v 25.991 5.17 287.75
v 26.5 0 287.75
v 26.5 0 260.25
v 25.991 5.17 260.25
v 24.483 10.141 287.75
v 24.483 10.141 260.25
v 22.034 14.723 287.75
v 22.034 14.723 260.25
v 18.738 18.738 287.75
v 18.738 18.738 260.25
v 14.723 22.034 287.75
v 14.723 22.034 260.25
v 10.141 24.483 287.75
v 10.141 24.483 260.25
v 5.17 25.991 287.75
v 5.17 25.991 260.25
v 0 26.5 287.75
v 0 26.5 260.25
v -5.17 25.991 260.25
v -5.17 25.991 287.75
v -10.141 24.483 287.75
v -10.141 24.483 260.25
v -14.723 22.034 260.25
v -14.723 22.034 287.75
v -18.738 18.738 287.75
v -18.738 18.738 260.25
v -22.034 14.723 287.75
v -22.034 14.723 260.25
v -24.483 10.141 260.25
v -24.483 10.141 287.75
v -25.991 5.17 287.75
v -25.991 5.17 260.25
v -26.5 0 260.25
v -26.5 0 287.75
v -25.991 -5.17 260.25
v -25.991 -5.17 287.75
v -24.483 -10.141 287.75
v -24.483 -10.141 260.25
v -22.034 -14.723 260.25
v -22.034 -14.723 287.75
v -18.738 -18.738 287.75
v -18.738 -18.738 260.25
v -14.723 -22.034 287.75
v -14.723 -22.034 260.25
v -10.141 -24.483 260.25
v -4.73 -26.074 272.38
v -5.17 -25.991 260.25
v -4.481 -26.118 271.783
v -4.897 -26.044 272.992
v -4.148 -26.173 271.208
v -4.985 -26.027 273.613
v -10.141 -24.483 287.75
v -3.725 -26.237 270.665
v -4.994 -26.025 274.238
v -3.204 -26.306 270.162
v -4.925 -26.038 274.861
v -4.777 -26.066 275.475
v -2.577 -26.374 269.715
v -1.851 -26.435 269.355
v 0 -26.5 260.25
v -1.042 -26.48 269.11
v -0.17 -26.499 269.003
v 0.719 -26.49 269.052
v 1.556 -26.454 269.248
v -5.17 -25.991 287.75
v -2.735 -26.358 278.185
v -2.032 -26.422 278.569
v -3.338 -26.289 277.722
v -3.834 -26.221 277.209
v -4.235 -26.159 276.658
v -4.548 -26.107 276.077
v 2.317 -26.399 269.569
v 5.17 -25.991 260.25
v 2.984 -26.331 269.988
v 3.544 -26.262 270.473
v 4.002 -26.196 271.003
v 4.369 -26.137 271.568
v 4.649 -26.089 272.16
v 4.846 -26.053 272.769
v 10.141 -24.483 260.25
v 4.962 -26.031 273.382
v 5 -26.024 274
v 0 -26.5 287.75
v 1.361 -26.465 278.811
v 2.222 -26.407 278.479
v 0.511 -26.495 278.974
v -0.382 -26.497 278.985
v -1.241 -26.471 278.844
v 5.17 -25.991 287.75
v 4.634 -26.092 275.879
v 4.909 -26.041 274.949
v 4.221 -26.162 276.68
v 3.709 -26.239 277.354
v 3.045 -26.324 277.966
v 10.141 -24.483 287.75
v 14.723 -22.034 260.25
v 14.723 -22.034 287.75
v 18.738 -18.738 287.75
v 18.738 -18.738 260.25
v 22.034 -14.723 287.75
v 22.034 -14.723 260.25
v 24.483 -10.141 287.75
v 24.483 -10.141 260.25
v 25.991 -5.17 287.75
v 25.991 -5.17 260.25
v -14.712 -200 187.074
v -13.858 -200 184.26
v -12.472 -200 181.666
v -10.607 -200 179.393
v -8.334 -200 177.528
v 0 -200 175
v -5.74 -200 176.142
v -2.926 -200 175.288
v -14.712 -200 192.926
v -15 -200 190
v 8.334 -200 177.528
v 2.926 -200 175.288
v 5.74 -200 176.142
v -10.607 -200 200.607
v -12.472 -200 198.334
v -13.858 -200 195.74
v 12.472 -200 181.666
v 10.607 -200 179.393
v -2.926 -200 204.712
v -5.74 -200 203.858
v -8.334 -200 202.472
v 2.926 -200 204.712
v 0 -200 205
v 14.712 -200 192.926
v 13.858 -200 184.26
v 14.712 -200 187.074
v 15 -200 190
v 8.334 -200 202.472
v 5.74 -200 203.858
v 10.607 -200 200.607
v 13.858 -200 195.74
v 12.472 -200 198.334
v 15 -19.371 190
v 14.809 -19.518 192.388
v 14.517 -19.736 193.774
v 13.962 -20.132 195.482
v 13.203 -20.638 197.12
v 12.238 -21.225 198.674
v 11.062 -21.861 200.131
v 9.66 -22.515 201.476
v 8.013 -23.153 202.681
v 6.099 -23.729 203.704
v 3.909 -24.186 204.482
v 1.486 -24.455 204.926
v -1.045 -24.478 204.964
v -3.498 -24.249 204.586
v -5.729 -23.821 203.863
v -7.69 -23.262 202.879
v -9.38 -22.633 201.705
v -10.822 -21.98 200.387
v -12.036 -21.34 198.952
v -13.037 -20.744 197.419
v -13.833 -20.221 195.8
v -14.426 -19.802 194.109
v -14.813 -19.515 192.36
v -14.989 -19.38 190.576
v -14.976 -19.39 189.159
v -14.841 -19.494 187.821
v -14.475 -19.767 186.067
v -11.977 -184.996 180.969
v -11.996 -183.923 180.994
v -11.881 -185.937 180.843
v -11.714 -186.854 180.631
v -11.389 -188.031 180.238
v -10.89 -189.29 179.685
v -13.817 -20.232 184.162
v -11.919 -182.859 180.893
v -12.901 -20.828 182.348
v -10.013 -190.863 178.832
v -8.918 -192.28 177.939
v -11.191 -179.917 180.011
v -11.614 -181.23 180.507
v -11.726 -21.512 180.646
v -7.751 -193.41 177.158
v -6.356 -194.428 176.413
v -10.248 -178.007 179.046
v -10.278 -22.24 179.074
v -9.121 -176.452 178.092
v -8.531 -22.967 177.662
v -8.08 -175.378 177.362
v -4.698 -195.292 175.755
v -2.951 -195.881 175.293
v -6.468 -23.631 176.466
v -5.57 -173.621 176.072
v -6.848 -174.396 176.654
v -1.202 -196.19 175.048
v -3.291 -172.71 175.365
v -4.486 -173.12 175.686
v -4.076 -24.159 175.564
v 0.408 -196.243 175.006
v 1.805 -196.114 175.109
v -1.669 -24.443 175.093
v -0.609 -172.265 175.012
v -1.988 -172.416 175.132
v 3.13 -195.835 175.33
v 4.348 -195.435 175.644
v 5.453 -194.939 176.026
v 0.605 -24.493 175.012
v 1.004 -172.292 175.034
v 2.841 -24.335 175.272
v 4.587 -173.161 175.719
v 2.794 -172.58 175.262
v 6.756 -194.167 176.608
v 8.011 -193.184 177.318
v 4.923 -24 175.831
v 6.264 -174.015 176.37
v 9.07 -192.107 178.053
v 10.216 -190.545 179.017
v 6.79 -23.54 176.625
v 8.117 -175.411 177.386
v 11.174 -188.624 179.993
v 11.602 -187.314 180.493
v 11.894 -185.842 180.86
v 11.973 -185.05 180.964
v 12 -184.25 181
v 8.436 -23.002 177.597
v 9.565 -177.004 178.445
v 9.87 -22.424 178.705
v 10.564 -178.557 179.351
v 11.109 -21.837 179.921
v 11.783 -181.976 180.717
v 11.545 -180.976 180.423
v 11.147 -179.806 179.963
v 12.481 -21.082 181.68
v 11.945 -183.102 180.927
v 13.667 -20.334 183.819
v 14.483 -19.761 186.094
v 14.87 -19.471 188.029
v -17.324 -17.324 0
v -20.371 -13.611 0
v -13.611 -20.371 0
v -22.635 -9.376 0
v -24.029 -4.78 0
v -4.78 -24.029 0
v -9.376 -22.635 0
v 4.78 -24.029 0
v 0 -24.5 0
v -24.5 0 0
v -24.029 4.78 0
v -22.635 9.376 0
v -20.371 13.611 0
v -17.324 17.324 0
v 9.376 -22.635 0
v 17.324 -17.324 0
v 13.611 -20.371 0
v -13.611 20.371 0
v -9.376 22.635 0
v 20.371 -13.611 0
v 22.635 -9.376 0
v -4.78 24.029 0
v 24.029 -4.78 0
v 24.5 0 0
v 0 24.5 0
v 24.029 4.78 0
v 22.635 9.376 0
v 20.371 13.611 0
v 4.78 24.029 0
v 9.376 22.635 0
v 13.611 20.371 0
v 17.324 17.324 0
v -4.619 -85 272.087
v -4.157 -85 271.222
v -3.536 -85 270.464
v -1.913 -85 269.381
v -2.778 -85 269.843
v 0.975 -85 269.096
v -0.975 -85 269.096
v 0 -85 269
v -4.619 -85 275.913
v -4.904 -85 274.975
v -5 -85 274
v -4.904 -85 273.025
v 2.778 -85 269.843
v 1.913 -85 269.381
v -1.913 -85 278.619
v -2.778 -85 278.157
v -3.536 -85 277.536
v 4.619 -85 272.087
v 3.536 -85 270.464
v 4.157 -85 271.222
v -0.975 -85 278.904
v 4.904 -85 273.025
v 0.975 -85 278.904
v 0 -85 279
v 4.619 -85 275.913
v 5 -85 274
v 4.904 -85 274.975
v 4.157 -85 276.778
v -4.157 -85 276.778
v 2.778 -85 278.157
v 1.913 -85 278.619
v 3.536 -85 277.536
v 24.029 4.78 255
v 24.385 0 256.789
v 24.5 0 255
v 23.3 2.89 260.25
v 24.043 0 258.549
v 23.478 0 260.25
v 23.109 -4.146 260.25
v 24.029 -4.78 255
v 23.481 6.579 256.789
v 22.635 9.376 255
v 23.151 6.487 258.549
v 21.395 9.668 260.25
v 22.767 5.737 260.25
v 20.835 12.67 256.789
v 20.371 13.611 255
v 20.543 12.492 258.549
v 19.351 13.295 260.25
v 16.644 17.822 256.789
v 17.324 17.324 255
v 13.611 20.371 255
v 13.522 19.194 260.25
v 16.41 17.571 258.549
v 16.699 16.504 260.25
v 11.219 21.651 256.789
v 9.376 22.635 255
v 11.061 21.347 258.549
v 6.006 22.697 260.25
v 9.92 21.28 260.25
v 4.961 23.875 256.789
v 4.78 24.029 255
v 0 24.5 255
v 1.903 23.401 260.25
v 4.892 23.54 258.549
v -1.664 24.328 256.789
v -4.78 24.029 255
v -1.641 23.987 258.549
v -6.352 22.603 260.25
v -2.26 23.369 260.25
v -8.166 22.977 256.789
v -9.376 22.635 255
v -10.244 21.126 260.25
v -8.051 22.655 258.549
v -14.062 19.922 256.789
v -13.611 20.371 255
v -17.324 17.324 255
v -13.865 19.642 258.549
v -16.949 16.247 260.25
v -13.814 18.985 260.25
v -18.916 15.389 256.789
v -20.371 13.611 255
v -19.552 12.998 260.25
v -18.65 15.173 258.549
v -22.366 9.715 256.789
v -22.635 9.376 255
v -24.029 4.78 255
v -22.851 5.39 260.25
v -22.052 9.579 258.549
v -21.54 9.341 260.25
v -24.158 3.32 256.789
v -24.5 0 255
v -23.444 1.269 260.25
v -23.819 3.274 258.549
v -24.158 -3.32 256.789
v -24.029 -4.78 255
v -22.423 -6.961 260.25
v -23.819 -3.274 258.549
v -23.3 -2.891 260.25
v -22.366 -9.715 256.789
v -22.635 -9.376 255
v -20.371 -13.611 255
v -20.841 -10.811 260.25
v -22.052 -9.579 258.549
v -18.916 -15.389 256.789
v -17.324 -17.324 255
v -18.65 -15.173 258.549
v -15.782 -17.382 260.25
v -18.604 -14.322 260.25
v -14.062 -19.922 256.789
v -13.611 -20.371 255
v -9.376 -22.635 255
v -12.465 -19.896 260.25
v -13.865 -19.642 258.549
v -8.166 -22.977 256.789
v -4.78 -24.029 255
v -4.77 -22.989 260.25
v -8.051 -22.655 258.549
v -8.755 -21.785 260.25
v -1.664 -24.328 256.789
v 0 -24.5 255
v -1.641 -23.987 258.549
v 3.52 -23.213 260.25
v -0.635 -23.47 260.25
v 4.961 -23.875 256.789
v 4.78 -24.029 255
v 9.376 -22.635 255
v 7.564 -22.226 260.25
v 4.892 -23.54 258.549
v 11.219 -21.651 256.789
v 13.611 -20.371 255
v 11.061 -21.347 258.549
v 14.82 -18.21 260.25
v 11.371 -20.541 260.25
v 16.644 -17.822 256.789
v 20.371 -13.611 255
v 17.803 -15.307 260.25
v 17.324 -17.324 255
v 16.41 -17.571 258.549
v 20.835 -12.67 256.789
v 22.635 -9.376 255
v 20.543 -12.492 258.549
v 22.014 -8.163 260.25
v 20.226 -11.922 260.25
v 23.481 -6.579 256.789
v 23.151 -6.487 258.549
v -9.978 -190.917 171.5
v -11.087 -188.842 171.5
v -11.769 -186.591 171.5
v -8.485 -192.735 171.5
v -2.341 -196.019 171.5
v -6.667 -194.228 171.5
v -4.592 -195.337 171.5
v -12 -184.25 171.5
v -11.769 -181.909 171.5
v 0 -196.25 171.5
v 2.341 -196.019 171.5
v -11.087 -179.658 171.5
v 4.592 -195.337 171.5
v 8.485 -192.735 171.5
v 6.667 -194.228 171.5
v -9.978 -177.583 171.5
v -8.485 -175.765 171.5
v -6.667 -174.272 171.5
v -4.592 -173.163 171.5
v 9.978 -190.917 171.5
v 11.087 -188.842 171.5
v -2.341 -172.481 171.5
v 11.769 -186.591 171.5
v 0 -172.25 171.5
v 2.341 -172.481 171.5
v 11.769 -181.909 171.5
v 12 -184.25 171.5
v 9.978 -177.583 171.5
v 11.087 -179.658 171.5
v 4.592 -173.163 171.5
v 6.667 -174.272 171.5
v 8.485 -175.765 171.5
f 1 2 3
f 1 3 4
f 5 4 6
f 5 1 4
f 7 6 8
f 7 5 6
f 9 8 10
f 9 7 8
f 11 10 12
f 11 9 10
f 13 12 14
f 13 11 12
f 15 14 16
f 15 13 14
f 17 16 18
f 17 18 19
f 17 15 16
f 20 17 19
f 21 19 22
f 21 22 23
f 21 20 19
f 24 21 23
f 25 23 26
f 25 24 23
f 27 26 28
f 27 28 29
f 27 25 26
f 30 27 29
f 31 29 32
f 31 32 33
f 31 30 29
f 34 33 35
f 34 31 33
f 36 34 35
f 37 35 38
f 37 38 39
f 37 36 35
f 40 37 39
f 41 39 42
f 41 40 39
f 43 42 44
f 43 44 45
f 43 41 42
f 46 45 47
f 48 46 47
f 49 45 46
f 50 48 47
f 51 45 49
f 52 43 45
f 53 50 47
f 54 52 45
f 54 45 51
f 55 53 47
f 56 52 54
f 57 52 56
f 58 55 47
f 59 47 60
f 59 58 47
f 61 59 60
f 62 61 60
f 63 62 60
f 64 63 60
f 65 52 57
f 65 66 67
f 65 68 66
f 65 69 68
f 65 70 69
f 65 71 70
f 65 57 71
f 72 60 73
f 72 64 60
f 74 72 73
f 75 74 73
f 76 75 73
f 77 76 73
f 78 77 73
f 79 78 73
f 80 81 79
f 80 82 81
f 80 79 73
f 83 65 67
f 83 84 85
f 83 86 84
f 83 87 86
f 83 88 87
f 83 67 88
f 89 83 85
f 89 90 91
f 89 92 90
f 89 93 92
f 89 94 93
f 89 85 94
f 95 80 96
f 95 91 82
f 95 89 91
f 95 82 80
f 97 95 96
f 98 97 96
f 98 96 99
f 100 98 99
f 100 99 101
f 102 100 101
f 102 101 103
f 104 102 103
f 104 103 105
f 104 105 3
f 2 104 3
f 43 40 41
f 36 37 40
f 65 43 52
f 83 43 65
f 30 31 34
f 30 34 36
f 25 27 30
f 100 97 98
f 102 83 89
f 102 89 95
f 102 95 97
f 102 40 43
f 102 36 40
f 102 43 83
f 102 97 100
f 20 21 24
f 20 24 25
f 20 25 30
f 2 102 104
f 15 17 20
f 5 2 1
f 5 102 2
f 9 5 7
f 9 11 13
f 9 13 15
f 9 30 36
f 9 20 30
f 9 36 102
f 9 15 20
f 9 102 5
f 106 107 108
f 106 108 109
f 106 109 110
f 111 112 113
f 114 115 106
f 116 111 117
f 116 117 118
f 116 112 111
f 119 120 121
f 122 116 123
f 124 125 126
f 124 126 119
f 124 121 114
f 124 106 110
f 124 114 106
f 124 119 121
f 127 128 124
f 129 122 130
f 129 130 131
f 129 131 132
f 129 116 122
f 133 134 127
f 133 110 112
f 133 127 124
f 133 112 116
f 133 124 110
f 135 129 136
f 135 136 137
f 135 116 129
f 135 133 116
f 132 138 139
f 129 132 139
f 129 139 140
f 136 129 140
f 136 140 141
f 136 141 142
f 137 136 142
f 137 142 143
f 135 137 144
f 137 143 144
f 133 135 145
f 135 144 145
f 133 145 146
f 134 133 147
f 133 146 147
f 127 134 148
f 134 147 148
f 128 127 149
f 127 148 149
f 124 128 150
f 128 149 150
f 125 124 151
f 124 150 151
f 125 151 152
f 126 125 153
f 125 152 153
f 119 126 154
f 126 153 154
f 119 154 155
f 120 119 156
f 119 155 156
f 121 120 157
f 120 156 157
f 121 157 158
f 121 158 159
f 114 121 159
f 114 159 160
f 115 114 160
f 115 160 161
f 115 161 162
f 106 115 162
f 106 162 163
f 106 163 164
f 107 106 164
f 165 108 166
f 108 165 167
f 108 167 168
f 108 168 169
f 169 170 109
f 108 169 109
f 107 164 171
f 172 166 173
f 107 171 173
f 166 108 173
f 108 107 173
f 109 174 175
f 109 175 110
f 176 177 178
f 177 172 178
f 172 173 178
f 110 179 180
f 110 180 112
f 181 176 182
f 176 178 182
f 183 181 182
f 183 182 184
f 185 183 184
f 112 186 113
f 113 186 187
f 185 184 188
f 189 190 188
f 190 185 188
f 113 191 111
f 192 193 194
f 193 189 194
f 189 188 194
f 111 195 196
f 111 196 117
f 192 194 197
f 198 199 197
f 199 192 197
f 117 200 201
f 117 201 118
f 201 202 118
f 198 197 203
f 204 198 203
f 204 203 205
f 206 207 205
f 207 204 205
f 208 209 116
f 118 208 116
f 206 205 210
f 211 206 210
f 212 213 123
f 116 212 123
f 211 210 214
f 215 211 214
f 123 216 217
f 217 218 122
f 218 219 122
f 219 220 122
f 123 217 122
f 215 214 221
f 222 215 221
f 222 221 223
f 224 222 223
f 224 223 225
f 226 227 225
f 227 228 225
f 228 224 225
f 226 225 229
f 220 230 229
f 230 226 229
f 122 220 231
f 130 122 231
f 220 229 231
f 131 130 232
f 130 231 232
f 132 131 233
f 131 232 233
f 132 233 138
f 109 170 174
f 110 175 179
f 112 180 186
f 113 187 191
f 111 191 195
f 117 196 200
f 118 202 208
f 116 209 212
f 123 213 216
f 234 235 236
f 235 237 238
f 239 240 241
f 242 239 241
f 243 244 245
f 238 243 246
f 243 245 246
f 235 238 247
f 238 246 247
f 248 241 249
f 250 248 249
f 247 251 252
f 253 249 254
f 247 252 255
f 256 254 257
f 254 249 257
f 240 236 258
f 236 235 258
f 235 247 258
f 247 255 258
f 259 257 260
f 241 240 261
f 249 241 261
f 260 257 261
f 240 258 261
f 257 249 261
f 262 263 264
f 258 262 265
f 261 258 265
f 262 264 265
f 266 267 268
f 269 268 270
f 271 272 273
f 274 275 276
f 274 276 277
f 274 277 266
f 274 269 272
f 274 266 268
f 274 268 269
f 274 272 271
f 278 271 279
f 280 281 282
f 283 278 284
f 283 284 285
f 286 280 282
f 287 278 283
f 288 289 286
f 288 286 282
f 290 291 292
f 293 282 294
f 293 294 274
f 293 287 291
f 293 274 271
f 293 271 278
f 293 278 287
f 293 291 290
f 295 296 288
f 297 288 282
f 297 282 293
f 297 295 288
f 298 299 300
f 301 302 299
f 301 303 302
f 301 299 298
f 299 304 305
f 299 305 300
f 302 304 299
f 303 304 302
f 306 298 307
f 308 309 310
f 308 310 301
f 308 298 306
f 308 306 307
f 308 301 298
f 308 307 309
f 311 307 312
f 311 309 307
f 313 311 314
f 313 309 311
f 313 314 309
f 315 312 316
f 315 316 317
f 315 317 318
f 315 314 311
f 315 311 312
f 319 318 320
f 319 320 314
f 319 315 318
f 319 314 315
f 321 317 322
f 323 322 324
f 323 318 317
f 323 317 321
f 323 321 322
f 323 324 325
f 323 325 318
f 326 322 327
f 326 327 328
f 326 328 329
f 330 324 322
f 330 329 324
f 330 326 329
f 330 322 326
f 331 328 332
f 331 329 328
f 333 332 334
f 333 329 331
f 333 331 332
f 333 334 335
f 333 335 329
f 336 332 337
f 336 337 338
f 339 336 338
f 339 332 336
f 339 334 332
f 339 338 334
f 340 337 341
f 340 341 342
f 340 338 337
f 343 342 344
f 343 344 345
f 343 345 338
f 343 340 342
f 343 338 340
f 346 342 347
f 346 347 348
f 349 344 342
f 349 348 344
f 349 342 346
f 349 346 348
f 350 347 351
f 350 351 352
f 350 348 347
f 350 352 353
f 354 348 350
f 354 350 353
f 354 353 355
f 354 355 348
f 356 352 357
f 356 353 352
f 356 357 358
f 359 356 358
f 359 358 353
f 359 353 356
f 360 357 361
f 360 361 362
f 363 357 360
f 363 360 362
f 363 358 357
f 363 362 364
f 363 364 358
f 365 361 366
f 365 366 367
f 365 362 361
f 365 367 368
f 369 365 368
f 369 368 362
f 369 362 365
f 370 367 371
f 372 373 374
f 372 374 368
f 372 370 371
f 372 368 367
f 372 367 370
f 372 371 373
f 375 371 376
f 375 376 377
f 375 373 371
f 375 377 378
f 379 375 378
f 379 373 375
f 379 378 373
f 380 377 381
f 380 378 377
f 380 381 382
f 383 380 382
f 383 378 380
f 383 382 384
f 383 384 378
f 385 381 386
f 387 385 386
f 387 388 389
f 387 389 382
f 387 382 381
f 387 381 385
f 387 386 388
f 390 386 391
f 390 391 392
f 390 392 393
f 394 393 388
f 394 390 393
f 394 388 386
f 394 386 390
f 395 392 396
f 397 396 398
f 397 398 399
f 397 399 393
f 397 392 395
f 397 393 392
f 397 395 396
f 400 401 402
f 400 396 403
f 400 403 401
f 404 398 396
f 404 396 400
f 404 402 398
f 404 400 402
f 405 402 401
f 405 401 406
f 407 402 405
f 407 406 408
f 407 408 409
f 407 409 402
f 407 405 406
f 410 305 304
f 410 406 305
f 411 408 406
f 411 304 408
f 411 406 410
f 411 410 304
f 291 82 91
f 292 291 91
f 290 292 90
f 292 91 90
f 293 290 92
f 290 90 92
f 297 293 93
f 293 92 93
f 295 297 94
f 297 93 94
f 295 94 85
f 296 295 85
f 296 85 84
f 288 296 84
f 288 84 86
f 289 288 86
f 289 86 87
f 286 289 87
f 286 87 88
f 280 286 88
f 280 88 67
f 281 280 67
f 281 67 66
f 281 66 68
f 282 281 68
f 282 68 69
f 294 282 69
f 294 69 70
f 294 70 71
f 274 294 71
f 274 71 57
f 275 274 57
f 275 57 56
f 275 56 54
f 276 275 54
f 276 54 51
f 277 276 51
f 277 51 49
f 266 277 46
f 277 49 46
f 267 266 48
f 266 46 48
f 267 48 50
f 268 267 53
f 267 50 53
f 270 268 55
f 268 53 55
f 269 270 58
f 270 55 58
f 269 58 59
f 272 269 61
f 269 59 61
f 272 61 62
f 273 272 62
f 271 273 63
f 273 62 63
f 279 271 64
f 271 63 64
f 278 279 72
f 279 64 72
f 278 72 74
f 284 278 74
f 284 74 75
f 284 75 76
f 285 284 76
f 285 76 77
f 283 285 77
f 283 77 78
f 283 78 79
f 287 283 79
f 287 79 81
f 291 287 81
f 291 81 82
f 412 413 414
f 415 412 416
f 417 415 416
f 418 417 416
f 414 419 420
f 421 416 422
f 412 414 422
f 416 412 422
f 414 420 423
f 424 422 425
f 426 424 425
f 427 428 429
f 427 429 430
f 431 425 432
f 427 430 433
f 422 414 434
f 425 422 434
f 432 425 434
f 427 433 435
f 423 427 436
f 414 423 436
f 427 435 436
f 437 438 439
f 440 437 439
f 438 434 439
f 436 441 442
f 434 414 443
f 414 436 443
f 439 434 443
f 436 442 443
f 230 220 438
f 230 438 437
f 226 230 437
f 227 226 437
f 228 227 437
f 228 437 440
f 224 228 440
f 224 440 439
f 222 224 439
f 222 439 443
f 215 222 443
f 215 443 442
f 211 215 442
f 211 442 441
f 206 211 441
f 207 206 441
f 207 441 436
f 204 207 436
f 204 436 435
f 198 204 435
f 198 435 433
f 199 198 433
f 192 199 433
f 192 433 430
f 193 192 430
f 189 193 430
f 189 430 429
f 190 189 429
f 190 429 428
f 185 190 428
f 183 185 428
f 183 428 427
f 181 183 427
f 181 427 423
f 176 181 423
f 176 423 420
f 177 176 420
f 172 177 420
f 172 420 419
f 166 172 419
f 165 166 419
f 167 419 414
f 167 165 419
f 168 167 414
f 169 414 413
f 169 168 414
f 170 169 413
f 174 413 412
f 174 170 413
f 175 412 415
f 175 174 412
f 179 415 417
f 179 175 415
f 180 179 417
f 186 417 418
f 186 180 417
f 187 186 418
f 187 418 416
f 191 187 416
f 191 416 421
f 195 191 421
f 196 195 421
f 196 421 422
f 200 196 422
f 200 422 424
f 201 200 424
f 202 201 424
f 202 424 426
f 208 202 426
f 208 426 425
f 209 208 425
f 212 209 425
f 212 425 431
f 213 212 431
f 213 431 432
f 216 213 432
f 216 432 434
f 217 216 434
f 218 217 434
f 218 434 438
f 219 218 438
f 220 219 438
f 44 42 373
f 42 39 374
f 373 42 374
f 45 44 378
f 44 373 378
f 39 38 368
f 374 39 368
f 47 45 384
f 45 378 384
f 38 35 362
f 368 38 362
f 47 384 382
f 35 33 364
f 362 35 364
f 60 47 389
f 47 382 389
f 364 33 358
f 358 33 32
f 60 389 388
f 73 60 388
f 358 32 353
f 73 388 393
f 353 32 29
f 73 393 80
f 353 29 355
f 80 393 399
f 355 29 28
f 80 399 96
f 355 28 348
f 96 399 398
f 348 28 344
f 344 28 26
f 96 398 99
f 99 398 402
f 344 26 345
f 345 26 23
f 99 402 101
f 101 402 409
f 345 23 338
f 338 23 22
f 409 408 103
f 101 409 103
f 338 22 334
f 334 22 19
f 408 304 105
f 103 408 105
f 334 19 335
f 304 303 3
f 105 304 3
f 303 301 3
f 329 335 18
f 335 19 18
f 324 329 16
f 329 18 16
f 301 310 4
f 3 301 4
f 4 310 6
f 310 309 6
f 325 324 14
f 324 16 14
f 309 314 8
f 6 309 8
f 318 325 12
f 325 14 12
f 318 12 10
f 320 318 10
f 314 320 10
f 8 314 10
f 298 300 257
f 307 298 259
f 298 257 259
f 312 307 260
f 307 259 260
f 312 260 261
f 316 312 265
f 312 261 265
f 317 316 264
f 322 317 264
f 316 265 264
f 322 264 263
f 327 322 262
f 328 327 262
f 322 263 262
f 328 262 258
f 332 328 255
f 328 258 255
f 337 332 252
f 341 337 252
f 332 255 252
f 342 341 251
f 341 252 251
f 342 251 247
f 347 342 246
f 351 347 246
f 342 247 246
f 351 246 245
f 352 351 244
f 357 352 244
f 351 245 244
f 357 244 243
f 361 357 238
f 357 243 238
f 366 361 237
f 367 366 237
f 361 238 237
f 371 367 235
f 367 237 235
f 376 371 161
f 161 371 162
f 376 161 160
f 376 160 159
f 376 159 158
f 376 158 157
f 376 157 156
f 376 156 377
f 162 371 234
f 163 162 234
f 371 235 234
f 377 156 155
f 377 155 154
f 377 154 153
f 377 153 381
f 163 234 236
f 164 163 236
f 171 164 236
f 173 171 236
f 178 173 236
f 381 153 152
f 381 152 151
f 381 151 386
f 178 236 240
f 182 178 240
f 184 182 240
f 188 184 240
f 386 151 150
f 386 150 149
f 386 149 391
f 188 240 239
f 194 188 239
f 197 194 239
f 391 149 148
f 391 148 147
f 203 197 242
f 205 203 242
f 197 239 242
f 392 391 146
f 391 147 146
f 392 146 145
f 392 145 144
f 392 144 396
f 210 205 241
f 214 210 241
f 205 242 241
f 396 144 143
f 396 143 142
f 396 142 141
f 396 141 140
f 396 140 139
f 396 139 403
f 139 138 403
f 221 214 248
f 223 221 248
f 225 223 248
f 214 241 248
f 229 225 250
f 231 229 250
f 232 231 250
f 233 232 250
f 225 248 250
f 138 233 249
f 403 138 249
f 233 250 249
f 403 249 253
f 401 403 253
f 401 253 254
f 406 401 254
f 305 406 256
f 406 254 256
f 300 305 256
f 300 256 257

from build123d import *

# Parameters (mm, degrees)
F0_R      = 24.5
F1_DEPTH  = 255
F2_R      = 24.5
F3_DEPTH  = 14
F4_R      = 14
F6_R      = 26.5
F7_DEPTH  = 13.75
F8_R      = 5
F9_DEPTH  = 85
F10_R     = 15
F11_DEPTH = 200
F13_R     = 12
F14_DEPTH = 18.5


with BuildPart() as f1:
    # F0 (on Top) → F1 (new body)
    with BuildSketch(Plane.XY):
        Circle(F0_R)
    extrude(amount=F1_DEPTH)

    # F2 (on face) → F3 (join)
    with BuildSketch(Plane.XY.offset(255)):
        Circle(F2_R)
    extrude(amount=F3_DEPTH)

    # F4
    f4_edges = [f1.edges().sort_by_distance(p)[0] for p in [
        (-24.5, 0, 269),
    ]]
    fillet(f4_edges, radius=F4_R)

    # F6 (on offset) → F7 (join, symmetric)
    with BuildSketch(Plane.XY.offset(274)):
        Circle(F6_R)
    extrude(amount=F7_DEPTH, both=True)

    # F8 (on Front) → F9 (join)
    with BuildSketch(Plane.XZ):
        with Locations((0, 274)):
            Circle(F8_R)
    extrude(amount=F9_DEPTH)

    # F10 (on Front) → F11 (join)
    with BuildSketch(Plane.XZ):
        with Locations((0, 190)):
            Circle(F10_R)
    extrude(amount=F11_DEPTH)

    # F13 (on offset) → F14 (join)
    with BuildSketch(Plane.XY.offset(190)):
        with Locations((0, -184.25)):
            Circle(F13_R)
    extrude(amount=-F14_DEPTH)


solid = f1.part
